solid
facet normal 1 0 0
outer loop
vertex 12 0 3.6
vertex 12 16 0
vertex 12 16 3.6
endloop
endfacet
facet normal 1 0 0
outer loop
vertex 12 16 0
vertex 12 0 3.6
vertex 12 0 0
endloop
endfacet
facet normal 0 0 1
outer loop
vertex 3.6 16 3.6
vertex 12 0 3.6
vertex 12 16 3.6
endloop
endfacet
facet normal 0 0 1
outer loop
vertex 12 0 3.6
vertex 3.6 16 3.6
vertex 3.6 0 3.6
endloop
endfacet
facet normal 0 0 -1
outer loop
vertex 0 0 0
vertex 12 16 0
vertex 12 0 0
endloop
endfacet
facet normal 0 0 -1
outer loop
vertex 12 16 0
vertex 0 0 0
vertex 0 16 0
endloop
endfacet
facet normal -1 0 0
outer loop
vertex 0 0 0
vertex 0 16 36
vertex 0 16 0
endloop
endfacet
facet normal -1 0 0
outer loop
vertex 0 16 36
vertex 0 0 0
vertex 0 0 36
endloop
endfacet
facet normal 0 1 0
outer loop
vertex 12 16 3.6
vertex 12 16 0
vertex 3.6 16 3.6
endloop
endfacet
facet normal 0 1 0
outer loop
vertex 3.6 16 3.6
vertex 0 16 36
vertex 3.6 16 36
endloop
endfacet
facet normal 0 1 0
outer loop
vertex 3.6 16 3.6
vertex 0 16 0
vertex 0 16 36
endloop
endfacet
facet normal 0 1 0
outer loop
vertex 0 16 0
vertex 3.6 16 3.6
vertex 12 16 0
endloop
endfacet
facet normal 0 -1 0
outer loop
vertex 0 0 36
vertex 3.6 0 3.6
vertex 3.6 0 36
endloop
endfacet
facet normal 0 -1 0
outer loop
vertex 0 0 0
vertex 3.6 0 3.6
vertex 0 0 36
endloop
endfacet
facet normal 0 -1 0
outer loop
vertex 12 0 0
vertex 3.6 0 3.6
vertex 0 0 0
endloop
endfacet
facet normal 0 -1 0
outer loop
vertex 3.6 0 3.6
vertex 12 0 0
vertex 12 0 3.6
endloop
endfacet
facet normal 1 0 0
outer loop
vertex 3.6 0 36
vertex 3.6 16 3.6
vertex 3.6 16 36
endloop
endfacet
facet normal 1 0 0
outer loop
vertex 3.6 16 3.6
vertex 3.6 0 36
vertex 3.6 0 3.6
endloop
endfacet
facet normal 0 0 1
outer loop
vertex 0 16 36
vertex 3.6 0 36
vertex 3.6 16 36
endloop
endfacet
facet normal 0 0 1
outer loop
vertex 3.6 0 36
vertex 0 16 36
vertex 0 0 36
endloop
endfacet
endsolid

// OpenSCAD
//TRIPOD
//Tiefe Basis
t=43.6;
//Breite Basis
b=43.6;
//Tiefe Oben
t2=35;
//Breite Oben
b2=35;

//Höhe Total
ht=10.2;
//Höhe unterer Cubus
hb=1.6;

//plattendicke
pd=2.4;

//Höhe oben (polyhedron)
ho=ht-hb;
//?
td=(t-t2)/2;
//?
bd=(b-b2)/2;

//HANDY
//Breite Handy
bh=173.5*1.03;
//Höhe Handy
hh=79*1.03;
//Tiefe Handy mit Silikonhülle, ohne Kamera
th=11.0*1.03;

//Höhe Connector bis Micro
hc=11.0;

CubePoints = [
  [  0,  0,  0 ],  //0
  [ b,  0,  0 ],  //1
  [ b,  t,  0 ],  //2
  [  0,  t,  0 ],  //3
  [  bd,  bd,  ho ],  //4
  [ t-bd,  bd,  ho ],  //5
  [ t-bd,  t-bd,  ho ],  //6
  [  bd,  t-bd,  ho ]]; //7
  
CubeFaces = [
  [0,1,2,3],  // bottom
  [4,5,1,0],  // front
  [7,6,5,4],  // top
  [5,6,2,1],  // right
  [6,7,3,2],  // back
  [7,4,0,3]]; // left

module tripod()
{
    translate([-b/2,-t/2,hb])  
    polyhedron(CubePoints, CubeFaces);

    color("blue")
    translate([0,0,hb/2]) //in der höhe nicht center, daher hb/2 von der unteren tripod platte nach oben
    cube([t,b,hb], center=true);
}

module connector_plate()
{
    //2/3 der Plattendicke => pd/3*2
    color("silver")
    translate([0,0,ht])
    cube([t2,b2,pd/3*2], center=true);
}

module plate()
{
    color("green")
    translate([0,0,ht+pd/2])
    cube([bh+pd*2,t,pd], center=true);
}

module connector()
{
    color("orange")
    translate([0,0,ht+pd+hc/2])
    cube([bh+pd*2,t,hc], center=true);
}

module handy()
{
    color("silver")
    translate([0,0,ht+pd+hh/2])
    cube([bh,th,hh], center=true);
}

module screencut()
{
    color("red")
    translate([0,-(t-th)/2,ht+pd+hc/2])
    cube([bh-10*2,t,hc], center=true);
}

module connector_with_cuts()
{
    difference()
    {
        connector();
        handy();
        screencut();
    }
}

//tripod();
//connector_plate();
//plate();

//connector();
//handy();
//screencut();

//connector_with_cuts();

module pillar()
{
    cube([12,16,3.6]);
    cube([3.6,16,36]);
}

pillar();















module handy_old()
{
    color("silver")
    translate([(b-hh)/2,(t-th)/2,ht+pd])
    cube([hh,th,bh]);
}

module vorne()
{
    translate([bd,(t-th)/2-th,ht+pd])
    cube([b2,th,bh]);
}

module hinten()
{
    trh = (t-th)/2+th;
        translate([bd,(t-th)/2+th,ht+pd])
    cube([b2,th,bh]);
}

module stabilisator()
{
    cube([b2,(t-th)/2-th-td,ht]);
}

module stabilisatoren()
{
    translate([bd,td,ht])
    stabilisator();
    
    translate([bd,(t-th)/2+th*2,ht])
    stabilisator();
}

module platte_laptop()
{
translate([-t*3/2+b/2,-t*3/2+t/2,ht])
cube([t*3,t*3,pd]);
}

module platte_rogphone()
{
    color("#AAAAFF")
translate([-hh/2+b/2-dv,-t/2+t/2,ht])
cube([hh+dv*2,t,pd]);
}

module vorne_rechts()
{
    translate([b+hh/2-b/2-dv,(t-th)/2-th,ht+pd])
    cube([dv,th,bh]);
}

module vorne_links()
{
    translate([-hh/2+b/2,(t-th)/2-th,ht+pd])
    cube([dv,th,bh]);
}

//tripod();
//
////handy();
////vorne();
//hinten();
////stabilisatoren();
////platte_laptop();
//platte_rogphone();
//vorne_rechts();
//vorne_links();
//
//translate([dv,0,0])
//vorne_rechts();
//translate([dv,th,0])
//vorne_rechts();
//
//translate([-dv,0,0])
//vorne_links();
//translate([-dv,th,0])
//vorne_links();
